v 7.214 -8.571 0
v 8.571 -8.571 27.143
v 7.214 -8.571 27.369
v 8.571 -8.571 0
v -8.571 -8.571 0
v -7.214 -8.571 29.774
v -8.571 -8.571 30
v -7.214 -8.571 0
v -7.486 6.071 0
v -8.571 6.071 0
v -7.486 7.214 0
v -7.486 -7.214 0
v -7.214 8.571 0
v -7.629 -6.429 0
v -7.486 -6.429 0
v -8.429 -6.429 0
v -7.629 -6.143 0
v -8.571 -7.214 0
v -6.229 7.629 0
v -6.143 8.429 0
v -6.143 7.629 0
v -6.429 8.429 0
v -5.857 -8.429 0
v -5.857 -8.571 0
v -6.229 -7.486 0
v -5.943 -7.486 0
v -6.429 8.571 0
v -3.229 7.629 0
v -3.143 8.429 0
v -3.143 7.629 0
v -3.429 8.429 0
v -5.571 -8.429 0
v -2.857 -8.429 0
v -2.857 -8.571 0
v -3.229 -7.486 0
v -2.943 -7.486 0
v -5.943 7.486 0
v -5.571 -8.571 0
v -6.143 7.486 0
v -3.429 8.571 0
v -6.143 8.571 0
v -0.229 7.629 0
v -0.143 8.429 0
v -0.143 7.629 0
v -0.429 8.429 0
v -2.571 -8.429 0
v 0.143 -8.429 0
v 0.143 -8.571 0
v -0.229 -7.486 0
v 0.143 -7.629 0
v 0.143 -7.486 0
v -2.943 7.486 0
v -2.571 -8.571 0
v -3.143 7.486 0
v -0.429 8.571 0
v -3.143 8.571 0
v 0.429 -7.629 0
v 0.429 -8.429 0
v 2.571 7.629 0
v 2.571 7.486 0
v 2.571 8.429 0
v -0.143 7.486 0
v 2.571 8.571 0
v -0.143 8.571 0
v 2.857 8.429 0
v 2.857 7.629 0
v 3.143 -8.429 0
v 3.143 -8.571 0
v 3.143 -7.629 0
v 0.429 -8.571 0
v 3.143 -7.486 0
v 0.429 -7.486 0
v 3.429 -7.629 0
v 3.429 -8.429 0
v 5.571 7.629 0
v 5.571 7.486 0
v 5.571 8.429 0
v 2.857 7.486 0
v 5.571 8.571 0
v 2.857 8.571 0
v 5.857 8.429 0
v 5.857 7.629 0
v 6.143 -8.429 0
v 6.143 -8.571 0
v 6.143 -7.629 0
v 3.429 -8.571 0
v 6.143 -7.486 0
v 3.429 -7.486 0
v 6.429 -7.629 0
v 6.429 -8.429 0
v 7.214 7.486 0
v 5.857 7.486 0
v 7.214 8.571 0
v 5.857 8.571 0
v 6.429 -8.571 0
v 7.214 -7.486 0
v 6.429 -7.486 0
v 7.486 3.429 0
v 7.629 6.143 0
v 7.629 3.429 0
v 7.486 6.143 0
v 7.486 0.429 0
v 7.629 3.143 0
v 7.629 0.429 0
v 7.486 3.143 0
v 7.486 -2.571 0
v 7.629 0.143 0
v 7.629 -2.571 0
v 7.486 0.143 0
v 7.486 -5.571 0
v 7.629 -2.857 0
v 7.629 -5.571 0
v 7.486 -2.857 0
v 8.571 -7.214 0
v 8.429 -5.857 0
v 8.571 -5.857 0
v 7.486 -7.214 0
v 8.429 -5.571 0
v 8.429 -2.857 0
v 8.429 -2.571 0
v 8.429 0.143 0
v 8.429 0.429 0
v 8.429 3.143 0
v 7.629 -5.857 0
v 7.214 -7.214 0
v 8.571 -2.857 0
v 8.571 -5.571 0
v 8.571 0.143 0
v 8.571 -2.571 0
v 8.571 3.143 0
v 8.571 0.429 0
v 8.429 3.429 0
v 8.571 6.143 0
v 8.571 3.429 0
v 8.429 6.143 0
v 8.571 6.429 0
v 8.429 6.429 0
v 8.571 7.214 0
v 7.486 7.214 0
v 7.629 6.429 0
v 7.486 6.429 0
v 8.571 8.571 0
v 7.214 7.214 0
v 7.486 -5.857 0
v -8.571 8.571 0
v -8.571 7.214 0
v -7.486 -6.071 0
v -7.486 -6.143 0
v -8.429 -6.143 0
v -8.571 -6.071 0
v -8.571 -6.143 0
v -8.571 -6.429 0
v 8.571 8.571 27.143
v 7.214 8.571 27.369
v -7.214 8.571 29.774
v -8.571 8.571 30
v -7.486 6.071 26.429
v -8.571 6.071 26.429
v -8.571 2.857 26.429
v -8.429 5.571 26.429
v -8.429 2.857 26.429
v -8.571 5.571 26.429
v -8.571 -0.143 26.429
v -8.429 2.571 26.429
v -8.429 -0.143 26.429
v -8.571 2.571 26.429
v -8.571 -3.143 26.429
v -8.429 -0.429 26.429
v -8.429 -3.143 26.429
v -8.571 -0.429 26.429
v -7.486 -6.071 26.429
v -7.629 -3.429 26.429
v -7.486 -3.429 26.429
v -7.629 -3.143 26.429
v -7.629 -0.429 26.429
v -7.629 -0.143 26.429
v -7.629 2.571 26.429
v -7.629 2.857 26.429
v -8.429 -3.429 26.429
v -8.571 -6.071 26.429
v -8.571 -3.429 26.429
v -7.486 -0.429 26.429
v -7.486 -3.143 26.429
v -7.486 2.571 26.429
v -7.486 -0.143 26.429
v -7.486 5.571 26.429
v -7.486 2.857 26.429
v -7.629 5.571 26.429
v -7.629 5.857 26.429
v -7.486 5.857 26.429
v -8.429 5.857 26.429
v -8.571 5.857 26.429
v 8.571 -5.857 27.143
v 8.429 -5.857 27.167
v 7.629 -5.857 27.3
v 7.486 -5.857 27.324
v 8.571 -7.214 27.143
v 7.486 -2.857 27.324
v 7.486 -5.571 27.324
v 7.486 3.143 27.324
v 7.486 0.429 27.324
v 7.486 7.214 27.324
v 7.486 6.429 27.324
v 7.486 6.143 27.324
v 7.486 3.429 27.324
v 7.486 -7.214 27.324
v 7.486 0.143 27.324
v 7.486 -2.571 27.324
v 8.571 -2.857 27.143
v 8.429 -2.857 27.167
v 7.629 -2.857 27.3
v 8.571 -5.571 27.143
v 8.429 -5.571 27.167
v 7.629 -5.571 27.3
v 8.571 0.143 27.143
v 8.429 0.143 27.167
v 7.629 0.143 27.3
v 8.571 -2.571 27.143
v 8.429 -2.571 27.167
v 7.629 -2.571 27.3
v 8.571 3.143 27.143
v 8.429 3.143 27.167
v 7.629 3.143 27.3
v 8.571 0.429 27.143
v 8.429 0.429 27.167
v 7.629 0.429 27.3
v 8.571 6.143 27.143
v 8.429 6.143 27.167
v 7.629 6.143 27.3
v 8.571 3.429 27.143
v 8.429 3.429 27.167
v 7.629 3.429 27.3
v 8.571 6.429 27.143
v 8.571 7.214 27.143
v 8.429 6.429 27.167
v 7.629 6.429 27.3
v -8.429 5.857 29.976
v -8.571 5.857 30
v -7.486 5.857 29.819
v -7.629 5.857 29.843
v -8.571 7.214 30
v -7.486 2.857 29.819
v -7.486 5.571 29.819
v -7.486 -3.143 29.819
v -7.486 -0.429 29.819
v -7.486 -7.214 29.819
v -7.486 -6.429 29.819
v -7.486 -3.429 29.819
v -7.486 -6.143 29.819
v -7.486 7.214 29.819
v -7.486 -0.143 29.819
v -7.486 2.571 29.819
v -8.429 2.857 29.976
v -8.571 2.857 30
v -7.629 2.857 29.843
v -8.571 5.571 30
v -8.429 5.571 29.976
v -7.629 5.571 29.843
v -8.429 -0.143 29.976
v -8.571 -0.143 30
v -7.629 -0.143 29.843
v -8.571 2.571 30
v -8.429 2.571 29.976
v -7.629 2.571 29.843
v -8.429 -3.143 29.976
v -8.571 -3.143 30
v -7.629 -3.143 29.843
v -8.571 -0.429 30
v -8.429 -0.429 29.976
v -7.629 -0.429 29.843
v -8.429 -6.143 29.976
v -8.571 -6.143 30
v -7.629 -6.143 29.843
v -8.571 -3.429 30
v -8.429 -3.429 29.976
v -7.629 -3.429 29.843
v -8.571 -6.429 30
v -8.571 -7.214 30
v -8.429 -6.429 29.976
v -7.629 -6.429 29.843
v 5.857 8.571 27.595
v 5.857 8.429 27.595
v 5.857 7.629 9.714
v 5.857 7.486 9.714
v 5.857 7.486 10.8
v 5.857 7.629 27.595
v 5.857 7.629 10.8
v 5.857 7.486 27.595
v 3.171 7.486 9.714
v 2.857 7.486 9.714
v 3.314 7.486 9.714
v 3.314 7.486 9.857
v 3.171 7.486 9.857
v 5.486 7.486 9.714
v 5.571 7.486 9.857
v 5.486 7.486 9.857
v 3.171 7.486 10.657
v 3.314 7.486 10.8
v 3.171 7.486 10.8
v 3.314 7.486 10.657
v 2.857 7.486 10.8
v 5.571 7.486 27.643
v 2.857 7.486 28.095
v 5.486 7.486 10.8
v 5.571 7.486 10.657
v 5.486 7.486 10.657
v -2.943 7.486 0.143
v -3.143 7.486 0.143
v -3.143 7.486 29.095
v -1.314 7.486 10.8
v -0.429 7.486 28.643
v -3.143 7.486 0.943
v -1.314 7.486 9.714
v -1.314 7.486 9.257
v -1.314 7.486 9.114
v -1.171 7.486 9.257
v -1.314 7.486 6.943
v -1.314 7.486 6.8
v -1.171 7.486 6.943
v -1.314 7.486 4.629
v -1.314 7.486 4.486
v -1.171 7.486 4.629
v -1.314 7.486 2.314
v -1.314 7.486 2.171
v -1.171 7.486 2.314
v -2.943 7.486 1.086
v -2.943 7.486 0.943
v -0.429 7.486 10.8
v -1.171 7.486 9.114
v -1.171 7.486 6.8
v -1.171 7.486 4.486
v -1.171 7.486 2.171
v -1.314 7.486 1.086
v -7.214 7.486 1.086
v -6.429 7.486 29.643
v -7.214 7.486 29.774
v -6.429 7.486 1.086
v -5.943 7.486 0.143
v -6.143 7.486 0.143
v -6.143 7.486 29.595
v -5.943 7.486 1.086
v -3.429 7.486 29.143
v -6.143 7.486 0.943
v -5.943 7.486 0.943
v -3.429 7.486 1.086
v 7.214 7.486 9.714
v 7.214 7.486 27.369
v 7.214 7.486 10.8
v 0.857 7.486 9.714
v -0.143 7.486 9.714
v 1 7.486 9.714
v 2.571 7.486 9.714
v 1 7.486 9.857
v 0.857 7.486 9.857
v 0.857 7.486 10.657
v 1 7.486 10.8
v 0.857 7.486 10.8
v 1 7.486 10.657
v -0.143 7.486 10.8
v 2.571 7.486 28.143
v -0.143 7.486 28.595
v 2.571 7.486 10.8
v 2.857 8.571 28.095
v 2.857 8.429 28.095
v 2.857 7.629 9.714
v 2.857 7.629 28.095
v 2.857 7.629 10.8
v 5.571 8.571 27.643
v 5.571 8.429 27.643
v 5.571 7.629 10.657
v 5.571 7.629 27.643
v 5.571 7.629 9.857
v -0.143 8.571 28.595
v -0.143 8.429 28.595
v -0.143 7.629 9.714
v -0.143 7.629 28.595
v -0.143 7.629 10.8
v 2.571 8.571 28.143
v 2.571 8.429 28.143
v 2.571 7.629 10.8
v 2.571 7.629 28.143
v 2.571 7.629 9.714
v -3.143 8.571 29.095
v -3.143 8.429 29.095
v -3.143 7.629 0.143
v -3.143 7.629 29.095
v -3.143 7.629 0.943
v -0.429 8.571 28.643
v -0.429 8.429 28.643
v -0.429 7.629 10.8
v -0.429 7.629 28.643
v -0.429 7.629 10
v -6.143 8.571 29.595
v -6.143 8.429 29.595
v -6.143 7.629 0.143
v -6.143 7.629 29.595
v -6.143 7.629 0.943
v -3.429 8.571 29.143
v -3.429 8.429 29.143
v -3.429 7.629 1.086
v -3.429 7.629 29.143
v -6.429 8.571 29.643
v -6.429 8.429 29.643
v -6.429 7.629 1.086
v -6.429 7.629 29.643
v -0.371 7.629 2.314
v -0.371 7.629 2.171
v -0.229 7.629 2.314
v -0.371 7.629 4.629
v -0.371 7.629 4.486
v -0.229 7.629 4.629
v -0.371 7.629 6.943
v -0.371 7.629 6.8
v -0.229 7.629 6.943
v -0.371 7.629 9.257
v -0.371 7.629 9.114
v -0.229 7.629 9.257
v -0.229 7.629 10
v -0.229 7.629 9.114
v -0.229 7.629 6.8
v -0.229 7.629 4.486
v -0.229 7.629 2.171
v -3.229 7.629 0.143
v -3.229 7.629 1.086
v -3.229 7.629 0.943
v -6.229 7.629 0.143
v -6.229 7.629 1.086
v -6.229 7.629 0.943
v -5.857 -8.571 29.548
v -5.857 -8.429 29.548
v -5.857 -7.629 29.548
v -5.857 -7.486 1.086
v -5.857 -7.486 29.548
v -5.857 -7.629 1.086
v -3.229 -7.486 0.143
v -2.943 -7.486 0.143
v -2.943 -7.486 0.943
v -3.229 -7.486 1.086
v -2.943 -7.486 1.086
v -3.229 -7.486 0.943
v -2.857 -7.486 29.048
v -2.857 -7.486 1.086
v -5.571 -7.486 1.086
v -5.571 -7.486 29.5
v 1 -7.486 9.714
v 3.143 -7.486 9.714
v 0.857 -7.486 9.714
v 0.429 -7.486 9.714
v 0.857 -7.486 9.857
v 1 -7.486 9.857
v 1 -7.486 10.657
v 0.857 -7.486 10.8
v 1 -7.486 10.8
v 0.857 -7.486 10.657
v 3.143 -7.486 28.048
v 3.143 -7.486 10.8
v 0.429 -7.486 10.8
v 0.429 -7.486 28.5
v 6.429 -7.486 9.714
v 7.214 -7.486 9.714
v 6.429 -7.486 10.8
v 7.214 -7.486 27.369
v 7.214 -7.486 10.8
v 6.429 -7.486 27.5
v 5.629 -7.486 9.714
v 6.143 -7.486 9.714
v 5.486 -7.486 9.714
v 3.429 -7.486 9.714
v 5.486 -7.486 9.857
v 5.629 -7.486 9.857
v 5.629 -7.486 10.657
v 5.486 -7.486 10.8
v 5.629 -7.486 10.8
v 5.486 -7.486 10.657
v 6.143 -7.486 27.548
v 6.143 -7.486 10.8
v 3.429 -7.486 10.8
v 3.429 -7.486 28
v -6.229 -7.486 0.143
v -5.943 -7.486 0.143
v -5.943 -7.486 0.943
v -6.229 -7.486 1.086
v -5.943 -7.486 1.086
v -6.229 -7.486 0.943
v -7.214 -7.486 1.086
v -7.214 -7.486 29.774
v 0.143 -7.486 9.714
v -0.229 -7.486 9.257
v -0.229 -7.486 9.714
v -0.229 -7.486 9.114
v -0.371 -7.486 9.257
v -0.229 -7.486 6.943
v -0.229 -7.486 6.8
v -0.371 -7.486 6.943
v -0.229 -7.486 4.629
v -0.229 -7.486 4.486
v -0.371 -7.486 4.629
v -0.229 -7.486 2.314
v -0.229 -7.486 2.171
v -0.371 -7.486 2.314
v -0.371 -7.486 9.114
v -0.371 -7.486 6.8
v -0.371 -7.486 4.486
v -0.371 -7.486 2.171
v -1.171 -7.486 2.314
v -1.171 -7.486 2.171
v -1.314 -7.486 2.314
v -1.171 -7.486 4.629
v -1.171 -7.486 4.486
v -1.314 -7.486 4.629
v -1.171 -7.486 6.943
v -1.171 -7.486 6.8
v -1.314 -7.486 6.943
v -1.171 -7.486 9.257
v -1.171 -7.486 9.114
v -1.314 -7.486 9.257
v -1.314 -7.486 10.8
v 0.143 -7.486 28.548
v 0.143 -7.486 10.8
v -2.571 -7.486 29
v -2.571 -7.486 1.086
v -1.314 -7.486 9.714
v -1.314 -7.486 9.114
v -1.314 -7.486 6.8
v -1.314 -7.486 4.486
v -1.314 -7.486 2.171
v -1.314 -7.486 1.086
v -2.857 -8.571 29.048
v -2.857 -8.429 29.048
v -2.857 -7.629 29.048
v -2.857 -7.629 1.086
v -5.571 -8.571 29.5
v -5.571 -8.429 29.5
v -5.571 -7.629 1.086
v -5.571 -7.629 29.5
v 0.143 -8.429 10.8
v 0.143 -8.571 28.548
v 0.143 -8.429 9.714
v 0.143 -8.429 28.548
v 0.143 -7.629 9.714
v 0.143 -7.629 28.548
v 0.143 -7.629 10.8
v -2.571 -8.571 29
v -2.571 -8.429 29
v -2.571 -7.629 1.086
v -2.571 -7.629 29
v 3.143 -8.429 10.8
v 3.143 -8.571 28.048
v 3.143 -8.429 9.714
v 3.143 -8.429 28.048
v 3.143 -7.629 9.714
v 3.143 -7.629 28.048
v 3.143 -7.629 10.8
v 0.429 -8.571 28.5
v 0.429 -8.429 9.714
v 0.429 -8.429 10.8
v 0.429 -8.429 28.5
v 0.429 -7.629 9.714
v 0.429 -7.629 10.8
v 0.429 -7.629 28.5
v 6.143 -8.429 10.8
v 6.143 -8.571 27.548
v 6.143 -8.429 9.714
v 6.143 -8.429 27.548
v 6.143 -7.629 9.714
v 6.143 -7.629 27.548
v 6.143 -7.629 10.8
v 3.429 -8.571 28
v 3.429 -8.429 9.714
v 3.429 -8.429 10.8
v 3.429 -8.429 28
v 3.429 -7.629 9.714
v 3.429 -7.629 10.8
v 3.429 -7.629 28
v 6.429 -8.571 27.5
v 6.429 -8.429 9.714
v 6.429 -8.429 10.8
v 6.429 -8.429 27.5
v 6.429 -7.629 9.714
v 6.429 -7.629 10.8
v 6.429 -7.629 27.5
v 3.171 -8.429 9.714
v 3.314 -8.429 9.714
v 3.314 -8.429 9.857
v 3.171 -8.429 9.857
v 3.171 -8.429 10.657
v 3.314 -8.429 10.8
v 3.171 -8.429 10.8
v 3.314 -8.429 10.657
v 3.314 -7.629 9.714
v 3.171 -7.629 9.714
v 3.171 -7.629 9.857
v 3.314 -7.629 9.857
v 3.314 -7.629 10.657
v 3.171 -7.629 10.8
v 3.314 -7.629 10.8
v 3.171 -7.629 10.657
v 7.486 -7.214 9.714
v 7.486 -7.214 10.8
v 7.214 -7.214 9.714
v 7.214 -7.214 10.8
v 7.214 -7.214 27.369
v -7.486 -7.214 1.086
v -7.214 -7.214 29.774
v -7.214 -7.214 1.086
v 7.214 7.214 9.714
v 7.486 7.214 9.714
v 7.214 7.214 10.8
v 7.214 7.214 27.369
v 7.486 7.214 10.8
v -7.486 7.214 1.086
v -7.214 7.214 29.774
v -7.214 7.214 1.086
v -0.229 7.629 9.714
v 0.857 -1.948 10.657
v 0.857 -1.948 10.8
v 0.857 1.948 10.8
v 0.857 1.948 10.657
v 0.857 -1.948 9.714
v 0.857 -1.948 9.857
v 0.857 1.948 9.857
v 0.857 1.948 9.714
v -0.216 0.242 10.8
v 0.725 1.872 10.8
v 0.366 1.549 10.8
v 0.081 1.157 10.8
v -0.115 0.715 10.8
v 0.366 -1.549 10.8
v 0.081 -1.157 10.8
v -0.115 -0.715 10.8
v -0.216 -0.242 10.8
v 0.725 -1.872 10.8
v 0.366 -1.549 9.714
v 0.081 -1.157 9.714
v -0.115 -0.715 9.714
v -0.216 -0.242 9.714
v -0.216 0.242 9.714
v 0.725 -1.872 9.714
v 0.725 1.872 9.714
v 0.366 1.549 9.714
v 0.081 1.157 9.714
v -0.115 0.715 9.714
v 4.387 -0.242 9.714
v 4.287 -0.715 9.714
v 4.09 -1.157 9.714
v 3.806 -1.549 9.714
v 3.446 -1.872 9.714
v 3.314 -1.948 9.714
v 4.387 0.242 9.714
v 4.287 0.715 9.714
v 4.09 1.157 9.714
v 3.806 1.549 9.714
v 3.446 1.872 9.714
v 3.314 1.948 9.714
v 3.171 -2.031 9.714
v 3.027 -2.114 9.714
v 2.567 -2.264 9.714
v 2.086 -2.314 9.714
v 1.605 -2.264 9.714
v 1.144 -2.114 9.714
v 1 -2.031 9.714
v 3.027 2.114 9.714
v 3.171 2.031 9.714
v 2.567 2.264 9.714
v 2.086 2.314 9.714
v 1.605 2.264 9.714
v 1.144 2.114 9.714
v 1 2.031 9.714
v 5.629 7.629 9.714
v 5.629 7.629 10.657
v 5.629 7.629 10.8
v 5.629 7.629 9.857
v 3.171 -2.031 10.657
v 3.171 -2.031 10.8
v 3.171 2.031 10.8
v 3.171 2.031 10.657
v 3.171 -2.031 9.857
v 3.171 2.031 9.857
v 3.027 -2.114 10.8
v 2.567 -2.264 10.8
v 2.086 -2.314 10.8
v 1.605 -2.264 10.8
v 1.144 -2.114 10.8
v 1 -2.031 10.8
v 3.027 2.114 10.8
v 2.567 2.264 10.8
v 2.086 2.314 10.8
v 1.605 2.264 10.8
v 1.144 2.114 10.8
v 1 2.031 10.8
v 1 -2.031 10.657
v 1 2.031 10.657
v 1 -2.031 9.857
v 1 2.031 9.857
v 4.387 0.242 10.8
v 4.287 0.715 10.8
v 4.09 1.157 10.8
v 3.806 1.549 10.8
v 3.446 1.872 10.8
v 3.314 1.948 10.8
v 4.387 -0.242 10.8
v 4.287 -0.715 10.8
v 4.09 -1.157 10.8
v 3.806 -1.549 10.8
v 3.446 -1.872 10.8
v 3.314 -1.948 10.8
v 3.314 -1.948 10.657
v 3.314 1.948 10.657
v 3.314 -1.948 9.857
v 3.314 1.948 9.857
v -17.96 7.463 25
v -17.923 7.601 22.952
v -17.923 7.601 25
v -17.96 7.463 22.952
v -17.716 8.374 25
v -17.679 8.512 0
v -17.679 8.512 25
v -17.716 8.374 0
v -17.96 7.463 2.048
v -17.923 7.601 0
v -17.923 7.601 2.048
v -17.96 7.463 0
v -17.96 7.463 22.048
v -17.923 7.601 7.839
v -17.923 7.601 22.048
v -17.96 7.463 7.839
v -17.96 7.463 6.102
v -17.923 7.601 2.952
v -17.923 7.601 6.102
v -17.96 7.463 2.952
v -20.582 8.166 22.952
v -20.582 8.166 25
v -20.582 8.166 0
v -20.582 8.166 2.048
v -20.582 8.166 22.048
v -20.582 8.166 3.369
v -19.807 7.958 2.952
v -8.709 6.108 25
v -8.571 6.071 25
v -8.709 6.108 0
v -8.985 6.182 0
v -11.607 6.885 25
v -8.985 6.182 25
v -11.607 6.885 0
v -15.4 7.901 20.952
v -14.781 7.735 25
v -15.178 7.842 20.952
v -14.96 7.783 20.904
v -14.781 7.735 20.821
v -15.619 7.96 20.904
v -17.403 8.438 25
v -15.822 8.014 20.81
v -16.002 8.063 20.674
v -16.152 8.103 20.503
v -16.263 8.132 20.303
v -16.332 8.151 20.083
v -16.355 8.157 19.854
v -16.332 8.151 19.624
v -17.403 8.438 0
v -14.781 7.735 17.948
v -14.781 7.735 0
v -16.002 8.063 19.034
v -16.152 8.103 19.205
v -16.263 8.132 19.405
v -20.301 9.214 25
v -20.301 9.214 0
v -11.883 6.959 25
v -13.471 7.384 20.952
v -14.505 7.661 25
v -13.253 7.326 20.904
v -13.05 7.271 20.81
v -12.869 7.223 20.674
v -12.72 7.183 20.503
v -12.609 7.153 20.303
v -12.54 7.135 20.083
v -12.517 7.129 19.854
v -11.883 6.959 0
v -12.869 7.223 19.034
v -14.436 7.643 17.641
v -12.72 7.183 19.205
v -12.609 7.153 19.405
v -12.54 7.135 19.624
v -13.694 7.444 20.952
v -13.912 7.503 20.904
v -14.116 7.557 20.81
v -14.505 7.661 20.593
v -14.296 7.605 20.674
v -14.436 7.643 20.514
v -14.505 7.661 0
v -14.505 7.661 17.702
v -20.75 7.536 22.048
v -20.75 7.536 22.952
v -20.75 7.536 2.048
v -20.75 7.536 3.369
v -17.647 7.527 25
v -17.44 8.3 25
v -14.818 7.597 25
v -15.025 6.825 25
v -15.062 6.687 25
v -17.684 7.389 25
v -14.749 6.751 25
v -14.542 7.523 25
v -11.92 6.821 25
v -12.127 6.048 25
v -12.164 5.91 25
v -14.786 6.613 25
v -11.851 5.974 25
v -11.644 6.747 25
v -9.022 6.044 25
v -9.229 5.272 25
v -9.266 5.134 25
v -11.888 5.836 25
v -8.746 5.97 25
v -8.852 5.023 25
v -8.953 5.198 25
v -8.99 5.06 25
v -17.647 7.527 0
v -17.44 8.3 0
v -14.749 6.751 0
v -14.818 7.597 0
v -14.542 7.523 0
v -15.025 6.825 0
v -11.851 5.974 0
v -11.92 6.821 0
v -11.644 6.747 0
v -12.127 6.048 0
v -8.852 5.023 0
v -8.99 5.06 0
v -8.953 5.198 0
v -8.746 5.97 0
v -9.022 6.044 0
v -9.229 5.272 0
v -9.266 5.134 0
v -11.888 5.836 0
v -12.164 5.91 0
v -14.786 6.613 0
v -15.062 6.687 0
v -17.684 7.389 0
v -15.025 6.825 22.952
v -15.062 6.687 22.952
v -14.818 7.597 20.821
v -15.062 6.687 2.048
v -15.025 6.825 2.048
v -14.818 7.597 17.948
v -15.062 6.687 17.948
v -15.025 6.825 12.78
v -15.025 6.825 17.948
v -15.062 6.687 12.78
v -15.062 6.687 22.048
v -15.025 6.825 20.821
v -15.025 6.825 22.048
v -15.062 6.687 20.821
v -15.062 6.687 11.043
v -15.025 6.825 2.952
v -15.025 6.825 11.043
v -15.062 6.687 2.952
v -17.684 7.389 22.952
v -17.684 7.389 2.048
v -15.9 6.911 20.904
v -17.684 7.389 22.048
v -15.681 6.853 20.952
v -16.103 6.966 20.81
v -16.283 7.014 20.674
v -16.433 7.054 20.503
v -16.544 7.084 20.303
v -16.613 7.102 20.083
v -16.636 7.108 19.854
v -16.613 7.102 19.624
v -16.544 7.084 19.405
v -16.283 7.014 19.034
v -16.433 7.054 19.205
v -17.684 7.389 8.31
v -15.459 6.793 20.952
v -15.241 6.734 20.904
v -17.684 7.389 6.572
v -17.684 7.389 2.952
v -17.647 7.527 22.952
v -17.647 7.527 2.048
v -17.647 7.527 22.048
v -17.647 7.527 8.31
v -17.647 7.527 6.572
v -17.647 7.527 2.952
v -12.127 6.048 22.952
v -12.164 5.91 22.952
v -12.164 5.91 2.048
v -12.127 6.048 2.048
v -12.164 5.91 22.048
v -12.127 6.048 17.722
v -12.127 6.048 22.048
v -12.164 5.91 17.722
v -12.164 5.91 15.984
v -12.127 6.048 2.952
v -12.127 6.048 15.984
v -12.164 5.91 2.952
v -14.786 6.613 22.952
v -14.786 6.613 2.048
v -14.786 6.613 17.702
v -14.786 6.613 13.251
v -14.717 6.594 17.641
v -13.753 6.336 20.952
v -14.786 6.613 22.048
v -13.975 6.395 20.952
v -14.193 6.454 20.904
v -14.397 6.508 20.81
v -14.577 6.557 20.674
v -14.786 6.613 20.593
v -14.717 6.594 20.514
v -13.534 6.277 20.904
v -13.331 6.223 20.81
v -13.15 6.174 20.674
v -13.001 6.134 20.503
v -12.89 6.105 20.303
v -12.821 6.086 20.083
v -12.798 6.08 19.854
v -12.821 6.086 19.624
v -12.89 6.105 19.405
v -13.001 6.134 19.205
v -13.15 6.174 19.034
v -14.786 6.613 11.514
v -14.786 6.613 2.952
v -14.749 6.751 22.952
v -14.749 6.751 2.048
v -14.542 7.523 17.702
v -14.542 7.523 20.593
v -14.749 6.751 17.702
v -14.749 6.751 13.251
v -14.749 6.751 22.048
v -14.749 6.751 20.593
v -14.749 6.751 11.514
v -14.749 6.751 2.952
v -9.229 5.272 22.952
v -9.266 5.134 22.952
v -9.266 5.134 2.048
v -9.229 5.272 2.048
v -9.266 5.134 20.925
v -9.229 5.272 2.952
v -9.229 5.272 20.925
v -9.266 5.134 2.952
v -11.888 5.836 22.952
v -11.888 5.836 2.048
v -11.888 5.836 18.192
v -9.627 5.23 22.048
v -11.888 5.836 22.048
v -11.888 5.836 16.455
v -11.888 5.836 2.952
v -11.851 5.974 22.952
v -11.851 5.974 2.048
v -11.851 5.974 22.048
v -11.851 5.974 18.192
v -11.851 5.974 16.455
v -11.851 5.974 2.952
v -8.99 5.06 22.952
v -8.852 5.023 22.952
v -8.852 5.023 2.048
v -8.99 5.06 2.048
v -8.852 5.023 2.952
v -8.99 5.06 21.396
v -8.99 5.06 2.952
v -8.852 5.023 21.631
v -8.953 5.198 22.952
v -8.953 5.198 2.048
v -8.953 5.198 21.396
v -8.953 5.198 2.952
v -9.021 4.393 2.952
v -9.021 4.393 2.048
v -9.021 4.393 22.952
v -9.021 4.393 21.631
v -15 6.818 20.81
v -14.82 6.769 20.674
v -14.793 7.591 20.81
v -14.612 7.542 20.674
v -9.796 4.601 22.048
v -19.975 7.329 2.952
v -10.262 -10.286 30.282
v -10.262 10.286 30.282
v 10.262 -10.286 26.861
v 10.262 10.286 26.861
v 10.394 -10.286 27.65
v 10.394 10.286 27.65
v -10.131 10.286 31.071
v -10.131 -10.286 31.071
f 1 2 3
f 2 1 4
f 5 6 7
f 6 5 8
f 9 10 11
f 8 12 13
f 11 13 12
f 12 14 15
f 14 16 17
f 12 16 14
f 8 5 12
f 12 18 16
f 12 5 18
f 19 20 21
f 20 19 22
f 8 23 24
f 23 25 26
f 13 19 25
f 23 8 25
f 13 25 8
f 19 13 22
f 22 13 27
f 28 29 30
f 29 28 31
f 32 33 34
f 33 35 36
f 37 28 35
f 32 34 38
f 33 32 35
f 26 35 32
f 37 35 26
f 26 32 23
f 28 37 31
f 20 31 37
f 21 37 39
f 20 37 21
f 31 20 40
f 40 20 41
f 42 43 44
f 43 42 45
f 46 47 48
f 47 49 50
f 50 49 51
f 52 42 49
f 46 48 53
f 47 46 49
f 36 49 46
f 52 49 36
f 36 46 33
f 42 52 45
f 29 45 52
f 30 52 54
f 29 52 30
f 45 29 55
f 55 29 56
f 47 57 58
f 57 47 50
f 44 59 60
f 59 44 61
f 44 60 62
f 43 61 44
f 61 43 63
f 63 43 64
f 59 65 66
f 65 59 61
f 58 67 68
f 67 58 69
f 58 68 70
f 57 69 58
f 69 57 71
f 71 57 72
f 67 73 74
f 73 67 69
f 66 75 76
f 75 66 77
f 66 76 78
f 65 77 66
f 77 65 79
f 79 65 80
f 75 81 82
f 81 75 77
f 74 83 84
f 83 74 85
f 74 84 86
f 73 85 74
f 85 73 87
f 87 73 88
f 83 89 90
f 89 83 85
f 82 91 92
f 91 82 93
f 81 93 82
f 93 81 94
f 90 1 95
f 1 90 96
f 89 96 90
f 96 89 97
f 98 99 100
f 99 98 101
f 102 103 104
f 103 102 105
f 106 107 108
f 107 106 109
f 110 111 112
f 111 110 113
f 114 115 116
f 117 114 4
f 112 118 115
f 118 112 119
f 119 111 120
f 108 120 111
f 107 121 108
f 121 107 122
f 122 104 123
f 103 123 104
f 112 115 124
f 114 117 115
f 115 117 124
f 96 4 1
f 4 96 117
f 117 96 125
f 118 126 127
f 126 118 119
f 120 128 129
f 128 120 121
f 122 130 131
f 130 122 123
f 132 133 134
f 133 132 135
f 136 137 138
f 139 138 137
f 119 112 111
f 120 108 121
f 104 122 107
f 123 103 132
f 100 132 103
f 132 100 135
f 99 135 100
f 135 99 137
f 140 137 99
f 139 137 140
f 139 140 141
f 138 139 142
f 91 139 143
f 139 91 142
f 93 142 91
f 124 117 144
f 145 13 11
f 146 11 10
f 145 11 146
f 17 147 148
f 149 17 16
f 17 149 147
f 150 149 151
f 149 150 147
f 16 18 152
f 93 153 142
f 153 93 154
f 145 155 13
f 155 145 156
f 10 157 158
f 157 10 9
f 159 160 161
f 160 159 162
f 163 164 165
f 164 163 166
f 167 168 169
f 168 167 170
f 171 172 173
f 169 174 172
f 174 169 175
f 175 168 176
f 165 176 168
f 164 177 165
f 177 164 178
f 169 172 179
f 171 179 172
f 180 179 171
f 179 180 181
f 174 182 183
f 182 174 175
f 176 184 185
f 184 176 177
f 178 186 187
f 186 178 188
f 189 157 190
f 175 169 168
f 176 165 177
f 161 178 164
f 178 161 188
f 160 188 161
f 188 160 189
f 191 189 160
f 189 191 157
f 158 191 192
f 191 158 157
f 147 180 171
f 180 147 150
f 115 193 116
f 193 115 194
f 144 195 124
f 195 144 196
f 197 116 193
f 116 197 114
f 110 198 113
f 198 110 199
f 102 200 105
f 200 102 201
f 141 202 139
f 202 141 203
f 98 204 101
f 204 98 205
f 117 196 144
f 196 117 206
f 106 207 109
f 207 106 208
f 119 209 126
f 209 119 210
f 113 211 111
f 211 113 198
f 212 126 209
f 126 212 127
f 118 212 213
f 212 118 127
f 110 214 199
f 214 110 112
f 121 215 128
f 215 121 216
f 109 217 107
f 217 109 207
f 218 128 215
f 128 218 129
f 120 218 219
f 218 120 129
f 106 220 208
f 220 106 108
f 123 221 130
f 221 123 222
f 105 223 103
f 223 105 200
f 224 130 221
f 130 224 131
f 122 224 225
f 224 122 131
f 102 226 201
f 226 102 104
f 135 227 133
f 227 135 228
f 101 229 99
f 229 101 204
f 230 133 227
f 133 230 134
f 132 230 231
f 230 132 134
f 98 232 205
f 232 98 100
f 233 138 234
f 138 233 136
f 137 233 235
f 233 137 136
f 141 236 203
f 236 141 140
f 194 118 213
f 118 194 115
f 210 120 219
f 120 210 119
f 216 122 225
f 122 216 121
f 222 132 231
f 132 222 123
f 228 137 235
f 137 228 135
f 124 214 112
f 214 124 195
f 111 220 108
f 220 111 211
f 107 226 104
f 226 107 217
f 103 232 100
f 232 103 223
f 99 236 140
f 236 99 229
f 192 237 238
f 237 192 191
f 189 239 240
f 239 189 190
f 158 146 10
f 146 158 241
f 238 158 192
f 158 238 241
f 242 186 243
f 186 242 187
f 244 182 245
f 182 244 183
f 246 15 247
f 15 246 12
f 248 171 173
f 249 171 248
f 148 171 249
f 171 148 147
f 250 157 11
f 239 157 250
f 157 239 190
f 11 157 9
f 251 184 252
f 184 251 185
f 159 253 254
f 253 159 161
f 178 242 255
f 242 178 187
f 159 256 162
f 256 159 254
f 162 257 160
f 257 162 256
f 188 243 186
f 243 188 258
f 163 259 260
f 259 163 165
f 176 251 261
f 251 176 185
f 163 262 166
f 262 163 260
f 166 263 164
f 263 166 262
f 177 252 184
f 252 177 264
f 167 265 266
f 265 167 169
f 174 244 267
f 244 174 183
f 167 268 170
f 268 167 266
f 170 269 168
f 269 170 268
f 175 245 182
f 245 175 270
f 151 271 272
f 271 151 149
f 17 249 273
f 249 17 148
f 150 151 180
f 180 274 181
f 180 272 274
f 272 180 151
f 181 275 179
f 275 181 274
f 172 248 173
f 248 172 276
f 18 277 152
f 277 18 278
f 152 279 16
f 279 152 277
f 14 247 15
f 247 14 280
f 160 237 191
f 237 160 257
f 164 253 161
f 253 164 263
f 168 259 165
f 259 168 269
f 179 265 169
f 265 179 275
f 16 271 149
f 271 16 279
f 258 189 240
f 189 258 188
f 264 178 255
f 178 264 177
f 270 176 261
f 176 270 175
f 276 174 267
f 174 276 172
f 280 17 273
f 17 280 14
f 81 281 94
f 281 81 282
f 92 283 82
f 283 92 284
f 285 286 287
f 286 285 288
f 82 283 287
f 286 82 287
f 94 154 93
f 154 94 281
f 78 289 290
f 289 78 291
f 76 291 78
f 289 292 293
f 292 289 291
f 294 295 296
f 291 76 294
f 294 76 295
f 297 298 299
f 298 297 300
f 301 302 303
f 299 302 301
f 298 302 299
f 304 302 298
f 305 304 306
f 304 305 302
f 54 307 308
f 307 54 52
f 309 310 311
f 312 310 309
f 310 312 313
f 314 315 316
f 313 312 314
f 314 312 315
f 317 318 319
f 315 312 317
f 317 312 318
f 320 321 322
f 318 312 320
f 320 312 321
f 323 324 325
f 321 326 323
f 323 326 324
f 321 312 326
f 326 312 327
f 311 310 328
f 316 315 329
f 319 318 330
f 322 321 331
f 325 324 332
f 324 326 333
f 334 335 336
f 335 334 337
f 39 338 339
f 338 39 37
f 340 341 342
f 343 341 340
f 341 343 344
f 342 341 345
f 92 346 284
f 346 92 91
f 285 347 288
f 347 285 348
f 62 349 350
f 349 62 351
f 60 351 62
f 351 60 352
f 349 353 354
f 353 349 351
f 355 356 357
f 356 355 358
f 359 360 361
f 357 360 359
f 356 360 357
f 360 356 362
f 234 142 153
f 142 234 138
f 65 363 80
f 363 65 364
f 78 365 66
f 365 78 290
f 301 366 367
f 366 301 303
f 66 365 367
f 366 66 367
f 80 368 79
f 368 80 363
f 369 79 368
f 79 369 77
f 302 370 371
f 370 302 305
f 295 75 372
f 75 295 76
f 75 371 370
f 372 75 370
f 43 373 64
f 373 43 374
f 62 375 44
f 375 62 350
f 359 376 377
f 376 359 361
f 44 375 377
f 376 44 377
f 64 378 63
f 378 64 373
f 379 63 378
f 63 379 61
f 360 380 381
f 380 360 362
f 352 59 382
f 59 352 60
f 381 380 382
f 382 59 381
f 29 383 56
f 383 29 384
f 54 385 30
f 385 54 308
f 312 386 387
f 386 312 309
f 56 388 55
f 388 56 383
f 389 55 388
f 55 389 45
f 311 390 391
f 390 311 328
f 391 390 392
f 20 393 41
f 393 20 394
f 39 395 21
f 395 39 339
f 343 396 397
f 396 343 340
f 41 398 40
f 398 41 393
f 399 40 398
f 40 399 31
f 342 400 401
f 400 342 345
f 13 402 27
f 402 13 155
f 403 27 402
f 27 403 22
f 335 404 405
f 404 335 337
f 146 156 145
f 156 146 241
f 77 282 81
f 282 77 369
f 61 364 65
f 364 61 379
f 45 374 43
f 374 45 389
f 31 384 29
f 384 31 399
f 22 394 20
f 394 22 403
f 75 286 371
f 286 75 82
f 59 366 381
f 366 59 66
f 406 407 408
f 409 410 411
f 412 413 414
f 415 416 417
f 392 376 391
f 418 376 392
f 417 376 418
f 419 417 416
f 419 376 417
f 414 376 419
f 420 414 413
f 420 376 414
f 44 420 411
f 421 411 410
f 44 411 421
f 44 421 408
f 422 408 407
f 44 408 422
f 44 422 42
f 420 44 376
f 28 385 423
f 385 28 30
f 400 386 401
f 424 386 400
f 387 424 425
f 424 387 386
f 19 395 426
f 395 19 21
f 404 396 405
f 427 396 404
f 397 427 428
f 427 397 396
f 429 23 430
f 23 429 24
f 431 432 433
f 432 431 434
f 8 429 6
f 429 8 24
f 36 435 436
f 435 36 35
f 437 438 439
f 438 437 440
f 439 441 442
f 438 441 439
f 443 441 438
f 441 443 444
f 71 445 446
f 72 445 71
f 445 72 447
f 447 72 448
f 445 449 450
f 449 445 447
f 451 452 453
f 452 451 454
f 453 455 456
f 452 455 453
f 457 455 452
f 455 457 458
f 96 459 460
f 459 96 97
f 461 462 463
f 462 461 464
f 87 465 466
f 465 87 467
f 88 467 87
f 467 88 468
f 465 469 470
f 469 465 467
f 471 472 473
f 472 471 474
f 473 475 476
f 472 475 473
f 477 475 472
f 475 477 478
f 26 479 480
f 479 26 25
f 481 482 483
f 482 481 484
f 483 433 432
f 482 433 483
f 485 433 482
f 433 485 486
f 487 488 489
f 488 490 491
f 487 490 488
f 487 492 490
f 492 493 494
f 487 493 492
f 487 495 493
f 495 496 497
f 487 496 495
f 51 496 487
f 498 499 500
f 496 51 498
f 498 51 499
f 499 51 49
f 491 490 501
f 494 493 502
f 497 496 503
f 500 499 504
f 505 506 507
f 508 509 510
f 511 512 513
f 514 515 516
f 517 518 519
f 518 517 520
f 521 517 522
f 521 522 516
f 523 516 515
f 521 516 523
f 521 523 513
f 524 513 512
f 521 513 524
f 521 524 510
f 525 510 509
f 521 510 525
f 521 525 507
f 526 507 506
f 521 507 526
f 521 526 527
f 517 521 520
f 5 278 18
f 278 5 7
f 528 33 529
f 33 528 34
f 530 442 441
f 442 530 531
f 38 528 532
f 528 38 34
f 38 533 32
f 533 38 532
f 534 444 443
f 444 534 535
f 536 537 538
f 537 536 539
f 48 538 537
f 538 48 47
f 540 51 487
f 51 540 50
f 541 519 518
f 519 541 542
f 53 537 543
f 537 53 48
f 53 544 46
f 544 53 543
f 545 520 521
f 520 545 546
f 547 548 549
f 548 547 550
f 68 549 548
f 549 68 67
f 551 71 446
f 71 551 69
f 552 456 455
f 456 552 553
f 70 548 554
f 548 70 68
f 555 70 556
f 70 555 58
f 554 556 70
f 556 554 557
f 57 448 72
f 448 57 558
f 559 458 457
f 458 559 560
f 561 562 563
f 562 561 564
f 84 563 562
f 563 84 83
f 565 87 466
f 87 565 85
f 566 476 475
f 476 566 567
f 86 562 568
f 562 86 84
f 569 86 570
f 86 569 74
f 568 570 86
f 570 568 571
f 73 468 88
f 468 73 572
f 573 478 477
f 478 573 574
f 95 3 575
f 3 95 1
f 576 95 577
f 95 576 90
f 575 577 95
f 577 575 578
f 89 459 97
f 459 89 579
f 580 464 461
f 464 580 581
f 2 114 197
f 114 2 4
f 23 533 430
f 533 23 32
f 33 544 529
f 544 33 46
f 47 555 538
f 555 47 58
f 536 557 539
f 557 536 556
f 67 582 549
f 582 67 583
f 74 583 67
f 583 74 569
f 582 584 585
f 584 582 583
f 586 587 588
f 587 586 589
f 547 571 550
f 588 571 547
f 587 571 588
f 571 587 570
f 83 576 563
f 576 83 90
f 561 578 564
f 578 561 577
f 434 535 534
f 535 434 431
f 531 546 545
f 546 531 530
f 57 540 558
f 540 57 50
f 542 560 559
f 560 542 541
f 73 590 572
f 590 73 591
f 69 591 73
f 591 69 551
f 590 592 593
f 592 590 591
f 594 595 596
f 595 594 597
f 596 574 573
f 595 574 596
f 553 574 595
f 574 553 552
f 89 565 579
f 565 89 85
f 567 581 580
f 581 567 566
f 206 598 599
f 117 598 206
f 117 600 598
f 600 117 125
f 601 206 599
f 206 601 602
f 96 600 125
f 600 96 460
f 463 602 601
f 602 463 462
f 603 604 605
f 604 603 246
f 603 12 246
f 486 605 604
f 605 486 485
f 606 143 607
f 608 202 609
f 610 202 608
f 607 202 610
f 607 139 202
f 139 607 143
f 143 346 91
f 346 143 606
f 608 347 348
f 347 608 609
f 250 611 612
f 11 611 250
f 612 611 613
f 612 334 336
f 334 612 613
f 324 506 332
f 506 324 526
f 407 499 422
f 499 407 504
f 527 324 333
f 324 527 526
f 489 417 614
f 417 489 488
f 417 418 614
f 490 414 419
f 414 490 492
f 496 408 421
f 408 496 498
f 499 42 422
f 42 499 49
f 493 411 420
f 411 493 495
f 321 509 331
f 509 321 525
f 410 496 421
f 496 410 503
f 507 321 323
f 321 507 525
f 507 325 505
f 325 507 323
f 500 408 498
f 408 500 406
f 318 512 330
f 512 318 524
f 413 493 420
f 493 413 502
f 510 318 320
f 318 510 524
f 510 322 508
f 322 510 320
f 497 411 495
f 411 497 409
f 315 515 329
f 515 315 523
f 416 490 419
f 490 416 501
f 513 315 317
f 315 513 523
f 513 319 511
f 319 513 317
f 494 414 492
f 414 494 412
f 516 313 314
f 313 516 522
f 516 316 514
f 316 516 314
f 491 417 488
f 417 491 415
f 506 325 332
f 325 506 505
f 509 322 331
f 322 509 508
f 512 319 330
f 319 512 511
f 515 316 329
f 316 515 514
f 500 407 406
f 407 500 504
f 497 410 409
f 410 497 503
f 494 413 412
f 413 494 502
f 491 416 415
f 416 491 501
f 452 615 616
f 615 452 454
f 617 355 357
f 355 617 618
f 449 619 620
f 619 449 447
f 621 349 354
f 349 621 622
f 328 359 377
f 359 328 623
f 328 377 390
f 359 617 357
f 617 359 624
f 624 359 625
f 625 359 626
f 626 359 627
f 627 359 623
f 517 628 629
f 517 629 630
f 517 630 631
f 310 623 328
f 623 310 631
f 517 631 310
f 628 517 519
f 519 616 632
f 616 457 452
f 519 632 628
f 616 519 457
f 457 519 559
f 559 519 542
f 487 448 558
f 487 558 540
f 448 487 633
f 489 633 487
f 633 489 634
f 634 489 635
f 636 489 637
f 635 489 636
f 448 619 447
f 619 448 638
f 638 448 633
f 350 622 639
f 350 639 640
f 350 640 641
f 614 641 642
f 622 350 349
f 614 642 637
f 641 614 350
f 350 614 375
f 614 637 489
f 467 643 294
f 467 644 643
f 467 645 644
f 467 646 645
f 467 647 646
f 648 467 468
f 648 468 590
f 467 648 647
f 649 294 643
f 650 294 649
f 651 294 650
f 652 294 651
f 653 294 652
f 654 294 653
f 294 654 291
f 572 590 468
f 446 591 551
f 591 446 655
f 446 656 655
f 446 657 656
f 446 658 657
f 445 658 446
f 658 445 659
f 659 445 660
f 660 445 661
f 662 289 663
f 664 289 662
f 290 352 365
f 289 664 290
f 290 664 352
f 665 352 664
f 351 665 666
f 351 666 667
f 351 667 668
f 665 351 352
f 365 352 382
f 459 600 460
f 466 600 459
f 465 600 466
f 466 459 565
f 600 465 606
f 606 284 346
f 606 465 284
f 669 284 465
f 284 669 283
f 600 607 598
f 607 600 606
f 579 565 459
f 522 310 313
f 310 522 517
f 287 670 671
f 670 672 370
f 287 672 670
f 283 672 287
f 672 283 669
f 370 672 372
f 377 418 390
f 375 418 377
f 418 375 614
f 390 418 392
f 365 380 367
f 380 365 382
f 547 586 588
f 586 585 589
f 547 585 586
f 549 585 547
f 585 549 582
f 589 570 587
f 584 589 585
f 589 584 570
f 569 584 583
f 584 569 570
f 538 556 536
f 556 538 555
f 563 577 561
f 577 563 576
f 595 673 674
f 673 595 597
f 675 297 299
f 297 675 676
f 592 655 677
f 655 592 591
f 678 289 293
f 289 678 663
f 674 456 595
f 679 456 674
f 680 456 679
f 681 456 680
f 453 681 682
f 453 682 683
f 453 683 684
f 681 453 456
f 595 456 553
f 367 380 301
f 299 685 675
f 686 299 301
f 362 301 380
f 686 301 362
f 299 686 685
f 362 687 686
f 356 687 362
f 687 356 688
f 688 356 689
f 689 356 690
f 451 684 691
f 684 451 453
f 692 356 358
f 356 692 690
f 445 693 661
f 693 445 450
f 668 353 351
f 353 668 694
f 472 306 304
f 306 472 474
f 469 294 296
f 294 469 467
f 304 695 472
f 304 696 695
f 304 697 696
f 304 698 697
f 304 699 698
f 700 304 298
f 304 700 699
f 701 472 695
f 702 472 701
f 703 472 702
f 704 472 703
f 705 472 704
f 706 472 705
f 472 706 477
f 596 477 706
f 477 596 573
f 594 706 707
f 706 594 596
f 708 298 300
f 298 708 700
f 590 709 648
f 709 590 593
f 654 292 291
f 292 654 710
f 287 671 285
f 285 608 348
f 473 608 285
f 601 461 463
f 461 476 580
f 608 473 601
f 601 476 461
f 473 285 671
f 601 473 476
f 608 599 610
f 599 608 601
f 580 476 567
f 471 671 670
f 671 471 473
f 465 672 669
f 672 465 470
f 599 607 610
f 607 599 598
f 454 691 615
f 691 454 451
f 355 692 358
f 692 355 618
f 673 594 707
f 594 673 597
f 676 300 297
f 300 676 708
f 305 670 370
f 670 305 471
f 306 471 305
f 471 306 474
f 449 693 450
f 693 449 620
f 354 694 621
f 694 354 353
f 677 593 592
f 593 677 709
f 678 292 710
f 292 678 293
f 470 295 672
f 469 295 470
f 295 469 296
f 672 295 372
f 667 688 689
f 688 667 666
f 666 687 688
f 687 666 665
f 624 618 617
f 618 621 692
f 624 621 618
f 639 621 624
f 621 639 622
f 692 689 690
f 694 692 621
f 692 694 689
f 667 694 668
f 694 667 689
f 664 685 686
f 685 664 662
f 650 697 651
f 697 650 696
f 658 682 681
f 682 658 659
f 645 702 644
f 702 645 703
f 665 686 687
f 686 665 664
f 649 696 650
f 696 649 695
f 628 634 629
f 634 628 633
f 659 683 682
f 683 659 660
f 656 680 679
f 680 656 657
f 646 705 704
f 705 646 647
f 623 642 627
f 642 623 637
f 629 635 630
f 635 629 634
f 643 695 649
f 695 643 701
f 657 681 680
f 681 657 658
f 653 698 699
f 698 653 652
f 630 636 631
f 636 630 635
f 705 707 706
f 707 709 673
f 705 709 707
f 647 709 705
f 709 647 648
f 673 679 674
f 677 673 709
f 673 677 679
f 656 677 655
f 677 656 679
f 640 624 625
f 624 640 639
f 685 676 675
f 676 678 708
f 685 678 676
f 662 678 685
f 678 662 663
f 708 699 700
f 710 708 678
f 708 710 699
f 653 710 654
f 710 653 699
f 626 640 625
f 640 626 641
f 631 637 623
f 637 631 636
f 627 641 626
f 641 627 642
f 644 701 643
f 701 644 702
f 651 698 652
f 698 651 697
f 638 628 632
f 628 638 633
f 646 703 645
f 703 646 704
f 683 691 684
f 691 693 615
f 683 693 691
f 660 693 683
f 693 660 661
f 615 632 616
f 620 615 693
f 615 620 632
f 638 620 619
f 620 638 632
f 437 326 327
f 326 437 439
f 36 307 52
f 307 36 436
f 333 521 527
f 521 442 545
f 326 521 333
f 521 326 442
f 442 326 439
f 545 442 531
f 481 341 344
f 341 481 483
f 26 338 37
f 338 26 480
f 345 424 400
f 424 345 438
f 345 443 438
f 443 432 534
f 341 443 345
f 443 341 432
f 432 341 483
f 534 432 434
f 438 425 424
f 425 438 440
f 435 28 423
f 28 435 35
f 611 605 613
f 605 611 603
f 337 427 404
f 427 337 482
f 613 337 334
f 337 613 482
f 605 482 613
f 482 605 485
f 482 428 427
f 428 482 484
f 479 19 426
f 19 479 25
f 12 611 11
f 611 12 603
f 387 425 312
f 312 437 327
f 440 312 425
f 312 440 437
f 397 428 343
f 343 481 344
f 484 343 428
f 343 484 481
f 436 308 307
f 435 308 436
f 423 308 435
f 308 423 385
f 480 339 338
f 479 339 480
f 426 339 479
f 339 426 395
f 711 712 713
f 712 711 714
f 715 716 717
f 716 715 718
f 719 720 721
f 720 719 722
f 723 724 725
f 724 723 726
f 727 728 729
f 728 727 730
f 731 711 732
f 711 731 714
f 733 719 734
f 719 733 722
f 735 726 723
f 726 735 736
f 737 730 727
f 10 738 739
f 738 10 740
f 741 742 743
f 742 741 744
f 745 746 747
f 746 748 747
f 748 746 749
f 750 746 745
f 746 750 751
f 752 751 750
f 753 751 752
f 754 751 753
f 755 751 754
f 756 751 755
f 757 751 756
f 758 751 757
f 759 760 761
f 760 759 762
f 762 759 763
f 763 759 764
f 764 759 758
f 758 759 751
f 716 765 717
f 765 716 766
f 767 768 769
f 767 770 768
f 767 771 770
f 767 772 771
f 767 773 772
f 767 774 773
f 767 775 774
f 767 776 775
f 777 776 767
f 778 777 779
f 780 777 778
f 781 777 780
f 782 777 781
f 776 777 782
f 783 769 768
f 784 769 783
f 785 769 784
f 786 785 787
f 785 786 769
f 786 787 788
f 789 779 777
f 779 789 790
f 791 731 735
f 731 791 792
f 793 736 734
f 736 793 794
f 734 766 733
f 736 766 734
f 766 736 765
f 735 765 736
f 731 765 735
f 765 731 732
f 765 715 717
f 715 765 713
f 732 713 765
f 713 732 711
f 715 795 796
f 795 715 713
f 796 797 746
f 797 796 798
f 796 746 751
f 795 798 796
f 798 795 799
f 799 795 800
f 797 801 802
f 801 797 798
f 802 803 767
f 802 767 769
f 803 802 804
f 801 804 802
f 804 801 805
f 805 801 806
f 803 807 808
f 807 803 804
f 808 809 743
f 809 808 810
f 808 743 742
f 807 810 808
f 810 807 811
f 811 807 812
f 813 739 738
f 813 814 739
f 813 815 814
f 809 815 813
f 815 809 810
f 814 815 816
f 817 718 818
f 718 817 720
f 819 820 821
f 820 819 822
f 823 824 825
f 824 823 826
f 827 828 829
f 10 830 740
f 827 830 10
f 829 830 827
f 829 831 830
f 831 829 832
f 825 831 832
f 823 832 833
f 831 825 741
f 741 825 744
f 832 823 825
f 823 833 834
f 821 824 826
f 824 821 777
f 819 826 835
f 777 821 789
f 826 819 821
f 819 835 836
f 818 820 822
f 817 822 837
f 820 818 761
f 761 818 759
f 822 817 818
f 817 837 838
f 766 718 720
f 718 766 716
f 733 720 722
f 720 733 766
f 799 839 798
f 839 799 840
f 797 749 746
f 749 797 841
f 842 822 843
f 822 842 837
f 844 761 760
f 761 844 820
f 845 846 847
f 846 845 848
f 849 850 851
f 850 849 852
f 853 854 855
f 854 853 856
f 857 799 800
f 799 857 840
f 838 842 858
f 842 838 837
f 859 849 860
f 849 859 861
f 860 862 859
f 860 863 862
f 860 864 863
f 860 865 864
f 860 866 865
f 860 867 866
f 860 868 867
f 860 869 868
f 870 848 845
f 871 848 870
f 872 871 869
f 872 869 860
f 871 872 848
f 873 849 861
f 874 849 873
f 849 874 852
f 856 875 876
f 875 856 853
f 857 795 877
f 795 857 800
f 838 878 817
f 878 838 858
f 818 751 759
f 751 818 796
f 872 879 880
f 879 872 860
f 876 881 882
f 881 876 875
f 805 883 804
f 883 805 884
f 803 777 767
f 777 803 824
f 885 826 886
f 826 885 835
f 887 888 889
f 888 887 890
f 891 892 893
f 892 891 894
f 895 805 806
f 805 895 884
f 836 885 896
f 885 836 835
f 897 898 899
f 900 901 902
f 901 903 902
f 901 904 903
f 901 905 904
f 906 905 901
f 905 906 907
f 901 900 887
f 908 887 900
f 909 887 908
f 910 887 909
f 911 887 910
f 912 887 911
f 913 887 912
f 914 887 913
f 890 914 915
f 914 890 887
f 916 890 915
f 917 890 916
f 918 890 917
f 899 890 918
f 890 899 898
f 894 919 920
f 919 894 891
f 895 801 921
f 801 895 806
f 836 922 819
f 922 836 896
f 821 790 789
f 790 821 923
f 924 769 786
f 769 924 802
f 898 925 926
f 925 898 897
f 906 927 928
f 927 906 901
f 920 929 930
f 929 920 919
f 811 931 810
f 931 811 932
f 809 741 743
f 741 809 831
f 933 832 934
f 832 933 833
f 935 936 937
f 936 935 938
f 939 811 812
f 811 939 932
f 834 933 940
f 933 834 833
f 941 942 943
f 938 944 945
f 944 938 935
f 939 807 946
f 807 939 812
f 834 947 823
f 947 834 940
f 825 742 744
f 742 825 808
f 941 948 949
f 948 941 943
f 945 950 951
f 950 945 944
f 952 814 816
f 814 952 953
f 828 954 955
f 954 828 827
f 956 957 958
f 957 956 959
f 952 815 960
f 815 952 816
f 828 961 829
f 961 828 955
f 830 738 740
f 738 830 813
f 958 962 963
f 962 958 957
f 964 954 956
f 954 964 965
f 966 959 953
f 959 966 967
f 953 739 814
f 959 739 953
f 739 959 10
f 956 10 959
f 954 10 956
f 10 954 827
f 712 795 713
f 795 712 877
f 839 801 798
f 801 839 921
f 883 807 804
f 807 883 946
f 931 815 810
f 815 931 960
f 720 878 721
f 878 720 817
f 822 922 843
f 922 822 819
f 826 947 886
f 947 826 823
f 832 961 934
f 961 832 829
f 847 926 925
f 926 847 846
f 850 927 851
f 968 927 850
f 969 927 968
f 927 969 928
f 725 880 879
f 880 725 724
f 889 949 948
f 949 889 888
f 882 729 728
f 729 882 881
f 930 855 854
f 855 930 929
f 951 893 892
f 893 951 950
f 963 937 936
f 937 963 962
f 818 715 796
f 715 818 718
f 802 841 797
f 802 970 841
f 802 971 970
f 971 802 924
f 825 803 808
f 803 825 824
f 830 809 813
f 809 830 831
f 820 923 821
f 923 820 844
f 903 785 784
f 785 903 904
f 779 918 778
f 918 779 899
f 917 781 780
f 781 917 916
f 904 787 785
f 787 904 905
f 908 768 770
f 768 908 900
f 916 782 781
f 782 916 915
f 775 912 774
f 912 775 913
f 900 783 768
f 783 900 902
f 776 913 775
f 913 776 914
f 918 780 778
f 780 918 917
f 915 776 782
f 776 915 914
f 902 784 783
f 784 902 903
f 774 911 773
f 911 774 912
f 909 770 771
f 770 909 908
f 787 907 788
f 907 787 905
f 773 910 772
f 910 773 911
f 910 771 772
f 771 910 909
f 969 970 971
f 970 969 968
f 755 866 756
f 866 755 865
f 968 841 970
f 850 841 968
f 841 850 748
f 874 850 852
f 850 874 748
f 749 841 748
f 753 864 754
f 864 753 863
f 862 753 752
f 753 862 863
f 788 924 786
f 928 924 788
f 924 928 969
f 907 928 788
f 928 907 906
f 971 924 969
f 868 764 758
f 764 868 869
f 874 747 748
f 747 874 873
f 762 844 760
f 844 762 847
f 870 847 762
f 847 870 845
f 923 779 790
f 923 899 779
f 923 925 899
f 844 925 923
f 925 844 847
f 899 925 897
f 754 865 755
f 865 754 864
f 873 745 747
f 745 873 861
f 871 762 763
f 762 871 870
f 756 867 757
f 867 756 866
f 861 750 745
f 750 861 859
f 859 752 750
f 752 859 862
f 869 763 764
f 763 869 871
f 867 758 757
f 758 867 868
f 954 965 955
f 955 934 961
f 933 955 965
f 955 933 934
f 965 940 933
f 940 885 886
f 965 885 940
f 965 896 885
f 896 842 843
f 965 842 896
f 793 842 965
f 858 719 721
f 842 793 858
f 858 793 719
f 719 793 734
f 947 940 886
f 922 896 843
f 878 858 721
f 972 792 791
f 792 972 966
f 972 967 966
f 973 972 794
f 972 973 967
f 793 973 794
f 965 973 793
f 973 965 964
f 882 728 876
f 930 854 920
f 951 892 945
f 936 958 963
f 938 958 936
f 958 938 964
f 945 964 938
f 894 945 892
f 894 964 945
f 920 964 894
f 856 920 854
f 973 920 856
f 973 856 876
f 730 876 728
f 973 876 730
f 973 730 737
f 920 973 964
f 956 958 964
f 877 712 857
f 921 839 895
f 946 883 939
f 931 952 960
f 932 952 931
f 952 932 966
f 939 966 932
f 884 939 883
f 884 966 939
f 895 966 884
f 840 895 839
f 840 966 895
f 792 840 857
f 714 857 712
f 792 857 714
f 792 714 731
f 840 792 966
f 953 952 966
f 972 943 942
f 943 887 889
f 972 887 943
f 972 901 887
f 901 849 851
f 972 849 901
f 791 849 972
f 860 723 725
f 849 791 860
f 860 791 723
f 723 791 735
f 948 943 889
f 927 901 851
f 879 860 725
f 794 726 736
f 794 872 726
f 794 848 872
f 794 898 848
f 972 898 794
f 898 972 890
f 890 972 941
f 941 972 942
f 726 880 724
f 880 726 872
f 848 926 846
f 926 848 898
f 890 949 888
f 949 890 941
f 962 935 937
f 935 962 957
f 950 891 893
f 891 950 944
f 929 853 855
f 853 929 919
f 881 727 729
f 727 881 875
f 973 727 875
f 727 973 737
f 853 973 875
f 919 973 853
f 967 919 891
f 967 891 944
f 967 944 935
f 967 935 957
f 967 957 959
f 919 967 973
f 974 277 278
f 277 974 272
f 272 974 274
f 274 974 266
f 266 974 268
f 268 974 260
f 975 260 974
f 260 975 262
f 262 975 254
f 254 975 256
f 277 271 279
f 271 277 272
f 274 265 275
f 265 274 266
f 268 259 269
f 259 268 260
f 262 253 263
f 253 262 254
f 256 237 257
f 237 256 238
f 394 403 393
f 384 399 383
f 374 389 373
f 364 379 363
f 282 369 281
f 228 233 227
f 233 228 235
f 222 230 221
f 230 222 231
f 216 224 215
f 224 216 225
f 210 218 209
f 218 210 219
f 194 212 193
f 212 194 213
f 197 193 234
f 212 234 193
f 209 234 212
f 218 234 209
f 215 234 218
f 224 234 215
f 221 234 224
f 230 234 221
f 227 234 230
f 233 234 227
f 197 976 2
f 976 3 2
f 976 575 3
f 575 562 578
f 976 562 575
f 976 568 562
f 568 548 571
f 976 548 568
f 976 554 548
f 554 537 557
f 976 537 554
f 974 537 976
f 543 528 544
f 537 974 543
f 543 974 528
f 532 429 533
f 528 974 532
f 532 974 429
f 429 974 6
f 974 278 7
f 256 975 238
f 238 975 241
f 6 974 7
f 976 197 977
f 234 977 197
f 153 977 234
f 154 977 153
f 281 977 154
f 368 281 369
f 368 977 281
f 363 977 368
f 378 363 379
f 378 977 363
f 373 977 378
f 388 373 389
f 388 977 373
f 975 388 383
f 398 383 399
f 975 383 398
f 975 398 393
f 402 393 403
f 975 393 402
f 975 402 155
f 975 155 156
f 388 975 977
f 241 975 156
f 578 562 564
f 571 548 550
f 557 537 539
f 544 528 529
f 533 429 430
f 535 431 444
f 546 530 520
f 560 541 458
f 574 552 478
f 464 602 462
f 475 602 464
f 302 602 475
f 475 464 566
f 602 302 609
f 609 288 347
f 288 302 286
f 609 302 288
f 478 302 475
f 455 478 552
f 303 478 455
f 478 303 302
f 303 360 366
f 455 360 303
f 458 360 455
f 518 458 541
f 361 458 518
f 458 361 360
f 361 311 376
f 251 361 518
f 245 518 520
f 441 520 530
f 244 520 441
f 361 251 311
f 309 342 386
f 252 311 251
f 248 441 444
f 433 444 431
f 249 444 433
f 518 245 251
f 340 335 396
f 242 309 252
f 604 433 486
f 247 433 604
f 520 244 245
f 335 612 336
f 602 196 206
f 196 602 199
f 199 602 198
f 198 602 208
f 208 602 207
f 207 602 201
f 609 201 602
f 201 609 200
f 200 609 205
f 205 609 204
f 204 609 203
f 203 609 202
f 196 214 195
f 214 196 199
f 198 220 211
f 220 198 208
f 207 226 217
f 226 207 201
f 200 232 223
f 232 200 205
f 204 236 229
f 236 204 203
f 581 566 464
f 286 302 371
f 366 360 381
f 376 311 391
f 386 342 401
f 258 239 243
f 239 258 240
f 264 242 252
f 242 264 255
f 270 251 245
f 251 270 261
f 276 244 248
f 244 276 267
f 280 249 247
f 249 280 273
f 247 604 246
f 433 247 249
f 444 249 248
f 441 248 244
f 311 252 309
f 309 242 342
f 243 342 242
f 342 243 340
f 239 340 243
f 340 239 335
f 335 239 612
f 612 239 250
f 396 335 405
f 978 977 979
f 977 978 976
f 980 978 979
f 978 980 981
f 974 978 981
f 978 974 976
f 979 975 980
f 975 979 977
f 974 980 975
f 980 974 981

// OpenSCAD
/*******************************************************************\
|         __  ____       _ ____        _ __                         |
|        /  |/  (_)___  (_) __ \____ _(_) /      ______ ___  __     |
|       / /|_/ / / __ \/ / /_/ / __ `/ / / | /| / / __ `/ / / /     |
|      / /  / / / / / / / _, _/ /_/ / / /| |/ |/ / /_/ / /_/ /      |
|     /_/  /_/_/_/ /_/_/_/ |_|\__,_/_/_/ |__/|__/\__,_/\__, /       |
|                                                     /____/        |
|*******************************************************************|
|                                                                   |
|                    Simple Wooden Latrine                          |
|                                                                   |
|                      designed by Svenny                           |
|                                                                   |
|       source: https://www.thingiverse.com/thing:3083176           |
|                                                                   |
\*******************************************************************/


/* [VIEW] */
// what to show
view = "arranged"; // [parts, arranged]
// scale
model_scale = 70;
// minimal wall thickness (real is this+plank_thickness)
min_wall_thickness = 0.8;
// roof thickness
roof_thickness = 0.8;

width = 1200 / model_scale;
length = 1200 / model_scale;
front_height = 2100 / model_scale;
back_height = 1900 / model_scale;
seat_height = 700 / model_scale;
seat_length = 0.45*length;

door_height = 1750 / model_scale;
door_hole_height = 1850 / model_scale;
door_width = 850 / model_scale;

plank_width = 190 / model_scale;
plank_thickness = 20 / model_scale;
plank_cleft = 20 / model_scale;

column_thickness = 95 / model_scale;

m_plank_thickness = plank_thickness+min_wall_thickness;

roof_offset = 120 / model_scale;

module plank_wall(length, height, thickness=m_plank_thickness, plank_width=plank_width, plank_cleft=plank_cleft) {
    cleft = plank_cleft;
    width = plank_width;
    intersection() {
        for(x=[-length/2:width+cleft:length/2])
            translate([x, 0, 0])
            cube([width, height, thickness]);
        translate([-length/2,0,0])
        cube([length, height, 2*thickness]);
    }
    translate([0, height/2, thickness/2])
    cube([length, height, min_wall_thickness], center=true);
}

module _building() {
    intersection() {
        difference() {
            hull() {
                translate([0, length/2, front_height/2])
                cube([width, 0.01, front_height], center=true);
                translate([0, -length/2, back_height/2])
                cube([width, 0.01, back_height], center=true);
            }
            translate([0, length/2, door_hole_height/2])
            cube([door_width, 3*m_plank_thickness, door_hole_height], center=true);
        }
        union() {
            for(x=[[-length/2+m_plank_thickness, 0], 
                   [-length/2+m_plank_thickness, 180],
                   [-width/2+m_plank_thickness, 90],
                   [-width/2+m_plank_thickness, 270]])
                rotate(x[1])
                translate([0, x[0], 0])
                rotate([90, 0, 0])
                plank_wall(width, front_height);
            
            corner_pos = [(width-column_thickness)/2, (length-column_thickness)/2];
            for(p=[[-1,-1], [-1,1], [1,-1], [1,1]])
                translate([p[0]*corner_pos[0], p[1]*corner_pos[1], front_height/2])
                cube([column_thickness, column_thickness, front_height], center=true);
        }
    }
}

module _seat() {
    translate([0,seat_length-length/2+m_plank_thickness, 0])
    rotate([-90, 0, 0])
    rotate(-90)
    translate([seat_height/2, (m_plank_thickness-width)/2])
    plank_wall(seat_height, width-m_plank_thickness, plank_width=0.8*plank_width, plank_cleft=0.5*plank_cleft);
    
    difference() {
        translate([0,seat_length-length/2+m_plank_thickness, seat_height-plank_thickness])
        rotate(-90)
        translate([(seat_length-m_plank_thickness)/2, (plank_thickness-width)/2])
        plank_wall(seat_length+m_plank_thickness, width-m_plank_thickness, plank_width=0.8*plank_width, plank_cleft=0.5*plank_cleft);
        
        translate([0, seat_length-(length)/2+m_plank_thickness-0.3*seat_length, seat_height])
        cylinder(d=0.6*seat_length, h=3*m_plank_thickness, center=true, $fn=30);
    }
}

module _whole_building() {
    _building();
    _seat();

    translate([0, -length/2+m_plank_thickness+seat_length, 0])
    rotate(90)
    translate([(length-2*m_plank_thickness-seat_length)/2, -(width-m_plank_thickness)/2, 0])
    plank_wall(length-2*m_plank_thickness-seat_length, width-m_plank_thickness);
}

module __heart_half(r, h) {
    hull() {
        translate([r/2.5,r/2,0])
        cylinder(d=r, h=h, $fn=30);
        translate([0,-r/2,0])
        cylinder(d=0.01, h=h, $fn=4);
    }
}

module _heart(r, h) {
    __heart_half(r, h);
    mirror()
    __heart_half(r, h);
}

module _door(simple=false) {
    difference() {
        plank_wall(door_width, door_height);
        translate([0, 0.75*door_height, -m_plank_thickness])
        _heart(door_width/5.5, 3*m_plank_thickness);
    }
    if(!simple) {
        intersection() {
            translate([-door_width/2, 0, 0])
            cube([door_width, door_height, 3*m_plank_thickness]);
            
            union() {
                for(j=[0.1, 0.9])
                    hull() {
                        for(i=[-1,1])
                            translate([i*door_width/2,
                                       j*door_height,
                                       0.6*m_plank_thickness])
                            cylinder(d=plank_width/3, h=m_plank_thickness, $fn=20);
                    }
                hull() {
                    translate([-door_width/2,
                               0.1*door_height,
                               0.6*m_plank_thickness])
                    cylinder(d=plank_width/3, h=m_plank_thickness, $fn=20);
                    translate([door_width/2,
                               0.9*door_height,
                               0.6*m_plank_thickness])
                    cylinder(d=plank_width/3, h=m_plank_thickness, $fn=20);
                }
            }
        }
    }
}

module _roof() {
    linear_extrude(roof_thickness)
    offset(delta=roof_offset)
    square([width, sqrt(length*length+(front_height-back_height)*(front_height-back_height))], center=true);
}

module arranged() {
    _whole_building();
    translate([door_width/2, length/2, 0])
    rotate(-105)
    translate([-door_width/2, 0, 0])
    rotate([90,0,0])
    _door();
    translate([0, 0, (front_height+back_height)/2])
    rotate([atan((front_height-back_height)/length),0,0])
    _roof();
}

module parts() {
    _whole_building();
    
    translate([width, -door_height/2, 0])
    _door();
    
    translate([-width-2*roof_offset, 0, 0])
    _roof();
}

if(view == "arranged")
    rotate(90)
    arranged();
else
    parts();
